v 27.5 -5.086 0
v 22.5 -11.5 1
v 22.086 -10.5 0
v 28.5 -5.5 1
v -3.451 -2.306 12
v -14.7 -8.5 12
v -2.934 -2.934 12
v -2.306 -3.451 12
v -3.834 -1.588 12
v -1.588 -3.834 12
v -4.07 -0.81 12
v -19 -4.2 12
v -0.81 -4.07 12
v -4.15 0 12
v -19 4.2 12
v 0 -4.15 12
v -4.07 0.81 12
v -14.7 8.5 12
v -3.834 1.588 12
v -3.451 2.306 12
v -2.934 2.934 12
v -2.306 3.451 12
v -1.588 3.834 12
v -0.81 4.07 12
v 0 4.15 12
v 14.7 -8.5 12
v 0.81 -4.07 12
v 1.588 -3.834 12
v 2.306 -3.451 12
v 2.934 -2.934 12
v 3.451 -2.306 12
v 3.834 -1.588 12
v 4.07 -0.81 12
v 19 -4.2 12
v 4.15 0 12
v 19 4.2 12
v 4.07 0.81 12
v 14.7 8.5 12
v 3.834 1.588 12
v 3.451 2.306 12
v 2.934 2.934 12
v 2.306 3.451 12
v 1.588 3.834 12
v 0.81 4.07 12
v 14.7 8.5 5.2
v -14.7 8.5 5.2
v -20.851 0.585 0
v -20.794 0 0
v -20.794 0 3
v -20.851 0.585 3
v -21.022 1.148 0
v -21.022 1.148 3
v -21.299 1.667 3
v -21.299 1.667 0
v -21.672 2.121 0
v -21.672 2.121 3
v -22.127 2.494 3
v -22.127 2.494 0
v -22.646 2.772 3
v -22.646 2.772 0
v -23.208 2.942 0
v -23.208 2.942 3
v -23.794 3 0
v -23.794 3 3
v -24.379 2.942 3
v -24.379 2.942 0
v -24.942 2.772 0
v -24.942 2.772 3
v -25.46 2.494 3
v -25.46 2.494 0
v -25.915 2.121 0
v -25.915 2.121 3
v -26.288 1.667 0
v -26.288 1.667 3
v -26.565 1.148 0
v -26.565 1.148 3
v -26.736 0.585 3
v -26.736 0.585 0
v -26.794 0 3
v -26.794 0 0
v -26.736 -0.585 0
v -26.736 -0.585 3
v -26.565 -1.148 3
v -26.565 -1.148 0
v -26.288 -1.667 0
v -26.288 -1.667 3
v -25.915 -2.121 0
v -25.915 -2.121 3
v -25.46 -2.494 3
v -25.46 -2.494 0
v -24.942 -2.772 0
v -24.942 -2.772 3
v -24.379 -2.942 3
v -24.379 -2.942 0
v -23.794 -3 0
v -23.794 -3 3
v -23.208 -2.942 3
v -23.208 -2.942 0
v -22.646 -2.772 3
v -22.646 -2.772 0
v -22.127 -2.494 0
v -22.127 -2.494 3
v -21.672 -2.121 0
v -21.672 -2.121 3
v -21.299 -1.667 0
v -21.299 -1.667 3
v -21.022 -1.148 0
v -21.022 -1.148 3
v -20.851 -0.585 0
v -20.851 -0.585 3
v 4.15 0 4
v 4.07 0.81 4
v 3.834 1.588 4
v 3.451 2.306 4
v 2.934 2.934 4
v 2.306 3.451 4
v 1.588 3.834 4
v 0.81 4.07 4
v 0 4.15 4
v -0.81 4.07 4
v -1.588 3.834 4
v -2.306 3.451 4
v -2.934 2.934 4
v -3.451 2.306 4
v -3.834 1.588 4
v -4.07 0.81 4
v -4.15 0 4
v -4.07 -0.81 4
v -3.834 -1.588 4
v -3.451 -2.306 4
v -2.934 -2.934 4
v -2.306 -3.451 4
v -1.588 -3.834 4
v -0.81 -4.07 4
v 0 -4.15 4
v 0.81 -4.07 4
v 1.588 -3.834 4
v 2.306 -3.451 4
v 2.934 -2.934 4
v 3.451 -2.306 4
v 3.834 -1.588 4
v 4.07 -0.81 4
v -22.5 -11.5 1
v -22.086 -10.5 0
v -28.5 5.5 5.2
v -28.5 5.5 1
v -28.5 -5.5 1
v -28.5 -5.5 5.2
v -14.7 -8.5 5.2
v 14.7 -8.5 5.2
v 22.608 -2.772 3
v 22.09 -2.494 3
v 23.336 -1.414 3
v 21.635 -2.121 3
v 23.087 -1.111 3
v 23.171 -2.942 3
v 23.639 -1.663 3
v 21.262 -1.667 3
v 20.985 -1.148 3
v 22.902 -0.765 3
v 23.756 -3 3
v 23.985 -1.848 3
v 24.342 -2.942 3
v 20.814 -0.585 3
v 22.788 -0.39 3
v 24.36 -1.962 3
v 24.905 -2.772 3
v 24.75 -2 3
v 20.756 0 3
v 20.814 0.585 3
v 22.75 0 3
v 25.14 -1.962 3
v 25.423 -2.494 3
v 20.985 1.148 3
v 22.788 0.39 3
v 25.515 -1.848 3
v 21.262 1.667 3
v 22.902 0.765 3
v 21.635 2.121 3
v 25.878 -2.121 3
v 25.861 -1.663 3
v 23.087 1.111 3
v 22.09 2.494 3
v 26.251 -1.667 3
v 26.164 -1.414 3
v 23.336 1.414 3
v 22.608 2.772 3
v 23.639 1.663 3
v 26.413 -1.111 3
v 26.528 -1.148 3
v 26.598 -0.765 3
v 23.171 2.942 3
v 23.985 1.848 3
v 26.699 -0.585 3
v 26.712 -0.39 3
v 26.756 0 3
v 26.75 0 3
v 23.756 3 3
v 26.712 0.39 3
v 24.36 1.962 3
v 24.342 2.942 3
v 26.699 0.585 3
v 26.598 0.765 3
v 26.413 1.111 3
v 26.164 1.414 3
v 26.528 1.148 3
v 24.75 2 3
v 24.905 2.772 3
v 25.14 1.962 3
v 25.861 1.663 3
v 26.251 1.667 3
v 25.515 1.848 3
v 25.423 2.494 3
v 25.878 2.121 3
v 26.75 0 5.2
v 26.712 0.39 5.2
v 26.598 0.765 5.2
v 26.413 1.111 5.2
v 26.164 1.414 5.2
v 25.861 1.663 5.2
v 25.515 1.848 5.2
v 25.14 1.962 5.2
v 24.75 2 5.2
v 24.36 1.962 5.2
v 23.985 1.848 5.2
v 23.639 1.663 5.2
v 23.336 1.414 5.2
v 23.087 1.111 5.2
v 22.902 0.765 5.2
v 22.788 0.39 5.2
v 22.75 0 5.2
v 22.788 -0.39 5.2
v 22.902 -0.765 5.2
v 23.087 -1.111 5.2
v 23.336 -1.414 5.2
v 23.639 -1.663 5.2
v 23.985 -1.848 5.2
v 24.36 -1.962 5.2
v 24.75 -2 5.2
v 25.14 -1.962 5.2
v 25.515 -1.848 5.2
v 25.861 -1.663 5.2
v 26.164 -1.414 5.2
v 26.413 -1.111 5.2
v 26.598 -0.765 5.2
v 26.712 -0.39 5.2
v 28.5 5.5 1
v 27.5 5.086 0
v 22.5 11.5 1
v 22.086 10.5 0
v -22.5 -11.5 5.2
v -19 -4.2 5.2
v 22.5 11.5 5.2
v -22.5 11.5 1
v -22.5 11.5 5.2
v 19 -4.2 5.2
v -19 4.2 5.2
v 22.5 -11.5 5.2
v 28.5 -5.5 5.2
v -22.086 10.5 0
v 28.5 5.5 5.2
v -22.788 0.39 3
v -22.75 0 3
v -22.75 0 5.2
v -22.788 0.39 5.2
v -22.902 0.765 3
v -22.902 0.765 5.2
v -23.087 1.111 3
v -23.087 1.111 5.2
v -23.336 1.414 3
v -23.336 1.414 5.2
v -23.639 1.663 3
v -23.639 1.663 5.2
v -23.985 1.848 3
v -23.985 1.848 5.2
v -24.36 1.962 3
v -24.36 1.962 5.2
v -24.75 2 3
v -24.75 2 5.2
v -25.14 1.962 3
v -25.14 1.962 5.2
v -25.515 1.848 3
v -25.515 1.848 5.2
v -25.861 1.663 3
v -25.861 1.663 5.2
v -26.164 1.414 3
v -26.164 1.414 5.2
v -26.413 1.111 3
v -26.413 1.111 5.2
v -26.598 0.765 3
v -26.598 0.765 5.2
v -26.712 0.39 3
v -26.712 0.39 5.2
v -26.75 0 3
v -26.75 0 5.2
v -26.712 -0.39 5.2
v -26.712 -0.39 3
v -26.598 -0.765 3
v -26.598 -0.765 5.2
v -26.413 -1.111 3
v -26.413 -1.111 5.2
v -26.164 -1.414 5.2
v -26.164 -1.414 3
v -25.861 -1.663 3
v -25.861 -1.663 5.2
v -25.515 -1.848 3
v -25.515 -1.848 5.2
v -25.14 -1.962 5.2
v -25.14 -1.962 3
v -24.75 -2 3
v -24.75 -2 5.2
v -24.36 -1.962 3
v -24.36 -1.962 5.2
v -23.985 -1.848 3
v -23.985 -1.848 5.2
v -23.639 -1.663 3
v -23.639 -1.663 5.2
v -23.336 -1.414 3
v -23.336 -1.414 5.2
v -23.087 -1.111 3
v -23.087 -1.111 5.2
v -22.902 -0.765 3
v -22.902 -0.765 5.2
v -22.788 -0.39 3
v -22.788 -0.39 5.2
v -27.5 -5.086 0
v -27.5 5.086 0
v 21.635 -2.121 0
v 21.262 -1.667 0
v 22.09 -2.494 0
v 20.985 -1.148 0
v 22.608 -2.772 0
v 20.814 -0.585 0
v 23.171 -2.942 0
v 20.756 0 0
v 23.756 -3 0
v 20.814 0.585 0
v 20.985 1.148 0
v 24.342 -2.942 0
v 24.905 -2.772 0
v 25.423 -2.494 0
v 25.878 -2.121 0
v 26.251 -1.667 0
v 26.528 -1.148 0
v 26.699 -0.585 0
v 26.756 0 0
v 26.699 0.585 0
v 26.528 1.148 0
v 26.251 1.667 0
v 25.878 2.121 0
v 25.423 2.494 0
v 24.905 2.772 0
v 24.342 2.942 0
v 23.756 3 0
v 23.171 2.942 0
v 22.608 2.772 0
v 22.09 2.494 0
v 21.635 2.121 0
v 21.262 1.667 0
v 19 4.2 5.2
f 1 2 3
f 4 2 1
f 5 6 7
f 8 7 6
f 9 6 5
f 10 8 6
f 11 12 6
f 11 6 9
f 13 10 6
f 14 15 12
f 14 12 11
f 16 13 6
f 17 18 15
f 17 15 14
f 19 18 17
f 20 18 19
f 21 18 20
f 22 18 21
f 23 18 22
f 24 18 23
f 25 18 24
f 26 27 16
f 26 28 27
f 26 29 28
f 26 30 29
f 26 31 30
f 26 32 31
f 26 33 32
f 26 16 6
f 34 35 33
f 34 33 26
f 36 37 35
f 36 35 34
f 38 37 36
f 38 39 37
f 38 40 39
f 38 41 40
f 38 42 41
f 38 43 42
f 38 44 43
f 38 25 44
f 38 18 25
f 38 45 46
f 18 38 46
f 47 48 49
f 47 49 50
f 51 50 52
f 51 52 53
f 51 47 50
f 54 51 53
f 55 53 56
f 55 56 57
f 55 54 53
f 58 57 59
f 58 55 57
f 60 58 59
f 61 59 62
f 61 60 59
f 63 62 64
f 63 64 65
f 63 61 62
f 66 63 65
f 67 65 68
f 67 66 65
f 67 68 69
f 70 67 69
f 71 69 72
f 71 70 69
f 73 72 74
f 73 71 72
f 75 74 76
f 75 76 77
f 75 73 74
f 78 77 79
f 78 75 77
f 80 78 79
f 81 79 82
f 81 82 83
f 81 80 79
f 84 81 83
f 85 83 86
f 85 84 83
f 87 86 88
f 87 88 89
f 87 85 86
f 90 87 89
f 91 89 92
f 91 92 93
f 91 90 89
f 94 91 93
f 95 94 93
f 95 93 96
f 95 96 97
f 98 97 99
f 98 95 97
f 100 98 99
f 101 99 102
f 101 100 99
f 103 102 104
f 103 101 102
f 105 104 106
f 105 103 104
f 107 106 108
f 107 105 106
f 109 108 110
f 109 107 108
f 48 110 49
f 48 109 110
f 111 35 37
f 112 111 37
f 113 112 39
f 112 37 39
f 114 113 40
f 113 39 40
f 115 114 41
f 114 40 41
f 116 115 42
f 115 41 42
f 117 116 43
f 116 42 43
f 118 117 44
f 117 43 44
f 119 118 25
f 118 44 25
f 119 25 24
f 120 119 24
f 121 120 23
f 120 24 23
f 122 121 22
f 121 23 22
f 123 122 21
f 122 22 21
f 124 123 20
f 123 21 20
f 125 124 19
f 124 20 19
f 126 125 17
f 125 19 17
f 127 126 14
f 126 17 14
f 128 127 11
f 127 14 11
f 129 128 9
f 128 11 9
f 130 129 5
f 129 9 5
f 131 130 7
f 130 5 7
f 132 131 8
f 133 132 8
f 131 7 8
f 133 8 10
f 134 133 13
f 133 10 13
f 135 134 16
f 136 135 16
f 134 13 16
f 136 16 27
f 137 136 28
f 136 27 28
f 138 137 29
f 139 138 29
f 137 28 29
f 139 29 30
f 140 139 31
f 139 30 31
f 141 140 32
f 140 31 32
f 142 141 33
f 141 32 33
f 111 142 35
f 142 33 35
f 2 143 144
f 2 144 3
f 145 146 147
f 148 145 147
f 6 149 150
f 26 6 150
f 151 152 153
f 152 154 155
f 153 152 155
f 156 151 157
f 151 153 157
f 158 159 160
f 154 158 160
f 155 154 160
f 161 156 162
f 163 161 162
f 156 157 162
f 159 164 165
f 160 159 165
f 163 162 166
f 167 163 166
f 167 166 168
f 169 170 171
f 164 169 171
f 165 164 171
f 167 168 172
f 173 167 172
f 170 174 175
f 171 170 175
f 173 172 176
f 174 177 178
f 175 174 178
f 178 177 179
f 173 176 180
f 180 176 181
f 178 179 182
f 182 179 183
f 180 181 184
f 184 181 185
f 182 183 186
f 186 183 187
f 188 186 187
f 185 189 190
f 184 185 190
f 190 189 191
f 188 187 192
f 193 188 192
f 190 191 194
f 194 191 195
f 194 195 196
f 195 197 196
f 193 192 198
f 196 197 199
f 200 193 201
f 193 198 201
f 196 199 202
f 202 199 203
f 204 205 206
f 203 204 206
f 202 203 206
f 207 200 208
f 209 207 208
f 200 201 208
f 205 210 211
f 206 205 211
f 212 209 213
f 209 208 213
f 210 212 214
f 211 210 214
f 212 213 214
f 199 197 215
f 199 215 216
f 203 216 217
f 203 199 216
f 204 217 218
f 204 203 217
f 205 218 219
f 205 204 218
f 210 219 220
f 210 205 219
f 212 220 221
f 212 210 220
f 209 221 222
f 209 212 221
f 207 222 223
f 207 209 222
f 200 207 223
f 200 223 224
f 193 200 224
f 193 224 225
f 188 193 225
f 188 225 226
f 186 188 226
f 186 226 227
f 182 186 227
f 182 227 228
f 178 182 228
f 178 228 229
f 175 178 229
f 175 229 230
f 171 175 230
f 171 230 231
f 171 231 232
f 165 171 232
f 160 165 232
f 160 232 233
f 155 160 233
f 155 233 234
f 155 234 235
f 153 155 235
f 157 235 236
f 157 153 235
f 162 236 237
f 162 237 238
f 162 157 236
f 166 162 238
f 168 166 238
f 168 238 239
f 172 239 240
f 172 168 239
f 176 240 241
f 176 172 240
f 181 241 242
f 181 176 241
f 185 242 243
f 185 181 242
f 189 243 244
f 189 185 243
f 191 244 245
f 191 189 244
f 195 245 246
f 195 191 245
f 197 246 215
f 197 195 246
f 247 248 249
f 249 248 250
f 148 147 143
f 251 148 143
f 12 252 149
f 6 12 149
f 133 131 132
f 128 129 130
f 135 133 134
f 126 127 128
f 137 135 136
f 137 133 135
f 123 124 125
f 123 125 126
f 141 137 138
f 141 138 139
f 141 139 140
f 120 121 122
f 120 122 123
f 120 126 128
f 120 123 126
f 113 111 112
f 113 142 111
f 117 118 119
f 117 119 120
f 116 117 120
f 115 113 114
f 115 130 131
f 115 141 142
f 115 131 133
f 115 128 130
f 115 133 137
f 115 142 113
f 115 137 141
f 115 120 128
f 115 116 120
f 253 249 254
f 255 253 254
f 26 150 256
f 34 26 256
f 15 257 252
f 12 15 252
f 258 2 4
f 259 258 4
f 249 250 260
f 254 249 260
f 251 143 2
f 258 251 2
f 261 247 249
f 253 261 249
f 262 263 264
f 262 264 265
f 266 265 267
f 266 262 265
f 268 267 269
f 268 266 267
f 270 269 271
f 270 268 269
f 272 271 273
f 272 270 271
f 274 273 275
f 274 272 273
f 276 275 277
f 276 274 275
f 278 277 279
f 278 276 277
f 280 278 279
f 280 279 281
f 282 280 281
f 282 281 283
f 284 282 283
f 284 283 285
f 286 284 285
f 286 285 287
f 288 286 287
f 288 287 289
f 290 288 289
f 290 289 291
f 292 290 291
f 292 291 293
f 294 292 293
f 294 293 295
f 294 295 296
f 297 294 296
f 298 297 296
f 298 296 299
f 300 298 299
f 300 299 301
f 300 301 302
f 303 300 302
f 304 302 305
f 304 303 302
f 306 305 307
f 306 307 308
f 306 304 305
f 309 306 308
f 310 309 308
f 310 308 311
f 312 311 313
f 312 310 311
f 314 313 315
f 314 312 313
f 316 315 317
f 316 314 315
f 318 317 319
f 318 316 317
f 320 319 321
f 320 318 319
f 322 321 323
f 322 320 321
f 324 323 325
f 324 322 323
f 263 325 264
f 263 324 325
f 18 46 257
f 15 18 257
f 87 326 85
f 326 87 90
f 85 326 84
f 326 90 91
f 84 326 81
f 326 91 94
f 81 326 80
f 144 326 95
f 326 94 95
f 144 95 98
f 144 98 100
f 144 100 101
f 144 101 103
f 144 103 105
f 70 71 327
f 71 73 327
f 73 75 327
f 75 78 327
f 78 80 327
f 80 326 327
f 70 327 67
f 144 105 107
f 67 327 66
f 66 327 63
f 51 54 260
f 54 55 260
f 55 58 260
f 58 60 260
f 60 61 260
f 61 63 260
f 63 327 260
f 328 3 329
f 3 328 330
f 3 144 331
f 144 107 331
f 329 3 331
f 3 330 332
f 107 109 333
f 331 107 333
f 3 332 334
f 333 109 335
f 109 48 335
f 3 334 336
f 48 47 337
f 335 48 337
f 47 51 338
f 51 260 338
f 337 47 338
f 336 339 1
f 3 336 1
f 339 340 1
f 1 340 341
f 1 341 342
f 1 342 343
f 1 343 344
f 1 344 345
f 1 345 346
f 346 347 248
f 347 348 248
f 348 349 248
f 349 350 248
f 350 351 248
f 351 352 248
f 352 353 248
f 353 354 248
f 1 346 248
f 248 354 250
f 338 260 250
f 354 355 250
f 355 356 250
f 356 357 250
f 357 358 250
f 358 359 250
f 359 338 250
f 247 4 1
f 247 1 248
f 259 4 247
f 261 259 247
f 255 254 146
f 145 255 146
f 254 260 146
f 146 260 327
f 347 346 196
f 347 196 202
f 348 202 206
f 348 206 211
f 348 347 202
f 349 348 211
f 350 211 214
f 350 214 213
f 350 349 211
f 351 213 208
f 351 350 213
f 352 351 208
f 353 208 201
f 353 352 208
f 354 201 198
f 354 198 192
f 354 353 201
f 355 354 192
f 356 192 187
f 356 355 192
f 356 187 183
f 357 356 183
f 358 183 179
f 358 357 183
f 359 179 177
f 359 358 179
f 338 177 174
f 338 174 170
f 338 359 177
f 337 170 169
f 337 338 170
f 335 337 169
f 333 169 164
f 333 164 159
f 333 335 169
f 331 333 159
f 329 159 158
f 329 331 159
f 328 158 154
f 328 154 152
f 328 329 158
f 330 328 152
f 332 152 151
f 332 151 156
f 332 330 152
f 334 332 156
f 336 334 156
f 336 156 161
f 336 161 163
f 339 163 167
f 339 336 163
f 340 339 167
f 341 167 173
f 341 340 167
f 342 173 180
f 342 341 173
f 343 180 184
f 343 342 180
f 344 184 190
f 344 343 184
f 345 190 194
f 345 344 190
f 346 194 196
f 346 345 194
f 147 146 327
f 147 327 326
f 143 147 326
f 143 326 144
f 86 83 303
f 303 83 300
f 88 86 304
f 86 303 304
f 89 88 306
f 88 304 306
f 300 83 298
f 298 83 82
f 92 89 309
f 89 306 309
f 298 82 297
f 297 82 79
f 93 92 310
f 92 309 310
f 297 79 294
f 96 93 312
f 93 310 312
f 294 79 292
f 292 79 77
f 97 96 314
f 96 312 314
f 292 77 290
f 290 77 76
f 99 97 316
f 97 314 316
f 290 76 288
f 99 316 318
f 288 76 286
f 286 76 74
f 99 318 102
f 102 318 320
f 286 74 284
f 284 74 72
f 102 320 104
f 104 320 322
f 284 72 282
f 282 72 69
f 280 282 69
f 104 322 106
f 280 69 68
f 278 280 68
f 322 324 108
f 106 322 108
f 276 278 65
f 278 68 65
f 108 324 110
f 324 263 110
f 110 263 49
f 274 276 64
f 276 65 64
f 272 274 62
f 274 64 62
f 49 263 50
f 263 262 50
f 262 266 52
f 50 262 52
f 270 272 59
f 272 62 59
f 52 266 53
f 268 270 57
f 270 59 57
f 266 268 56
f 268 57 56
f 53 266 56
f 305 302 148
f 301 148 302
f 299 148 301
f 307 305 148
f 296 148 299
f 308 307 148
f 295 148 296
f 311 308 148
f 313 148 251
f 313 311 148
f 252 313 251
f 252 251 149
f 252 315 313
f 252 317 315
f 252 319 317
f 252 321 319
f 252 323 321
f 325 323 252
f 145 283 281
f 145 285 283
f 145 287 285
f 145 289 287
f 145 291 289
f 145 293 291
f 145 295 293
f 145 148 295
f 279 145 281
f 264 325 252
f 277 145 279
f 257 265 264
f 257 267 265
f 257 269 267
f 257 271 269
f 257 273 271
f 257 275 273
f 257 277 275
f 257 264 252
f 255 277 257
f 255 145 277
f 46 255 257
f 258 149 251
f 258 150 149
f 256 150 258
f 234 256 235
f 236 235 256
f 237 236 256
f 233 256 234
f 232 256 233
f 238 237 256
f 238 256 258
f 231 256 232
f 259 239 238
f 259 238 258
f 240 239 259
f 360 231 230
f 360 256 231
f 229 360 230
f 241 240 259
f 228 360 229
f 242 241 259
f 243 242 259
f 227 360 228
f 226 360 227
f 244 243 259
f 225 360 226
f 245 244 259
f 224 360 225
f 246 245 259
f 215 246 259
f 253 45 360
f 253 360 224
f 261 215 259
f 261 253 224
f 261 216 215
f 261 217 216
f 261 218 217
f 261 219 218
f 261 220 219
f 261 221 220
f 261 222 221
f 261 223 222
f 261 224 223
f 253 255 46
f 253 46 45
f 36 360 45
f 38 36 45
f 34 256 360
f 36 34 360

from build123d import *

# Parameters (mm, degrees)
F1_DEPTH = 12
F0_R     = 2
F2_DEPTH = 5.2
F3_SIZE  = 1
F4_R     = 4.15
F5_DEPTH = 8
F6_R     = 3
F7_DEPTH = 3


with BuildPart() as f1:
    # F0 (on Top) → F1 (new body)
    with BuildSketch(Plane.XY):
        Polygon((14.7, 8.5), (-14.7, 8.5), (-19, 4.2), (-19, -4.2), (-14.7, -8.5), (14.7, -8.5), (19, -4.2), (19, 4.2), align=None)
    extrude(amount=F1_DEPTH)

    # F0 (on Top) → F2 (join)
    with BuildSketch(Plane.XY):
        Polygon((22.5, 11.5), (-22.5, 11.5), (-28.5, 5.5), (-28.5, -5.5), (-22.5, -11.5), (22.5, -11.5), (28.5, -5.5), (28.5, 5.5), align=None)
        with Locations((-24.75, 0)):
            Circle(F0_R, mode=Mode.SUBTRACT)
        Polygon((-19, 4.2), (-14.7, 8.5), (14.7, 8.5), (19, 4.2), (19, -4.2), (14.7, -8.5), (-14.7, -8.5), (-19, -4.2), align=None, mode=Mode.SUBTRACT)
        with Locations((24.75, 0)):
            Circle(F0_R, mode=Mode.SUBTRACT)
    extrude(amount=F2_DEPTH)

    # F3
    f3_edges = [f1.edges().sort_by_distance(p)[0] for p in [
        (0, -11.5, 0),
        (-25.5, -8.5, 0),
        (-28.5, 0, 0),
        (-25.5, 8.5, 0),
        (0, 11.5, 0),
        (25.5, 8.5, 0),
        (28.5, 0, 0),
        (25.5, -8.5, 0),
    ]]
    chamfer(f3_edges, length=F3_SIZE)

    # F4 (on face) → F5 (cut)
    with BuildSketch(Plane.XY.offset(12)):
        Circle(F4_R)
    extrude(amount=-F5_DEPTH, mode=Mode.SUBTRACT)

    # F6 (on Top) → F7 (cut)
    with BuildSketch(Plane.XY):
        with Locations((-23.793586, 0)):
            Circle(F6_R)
        with Locations((23.756452, 0)):
            Circle(F6_R)
    extrude(amount=F7_DEPTH, mode=Mode.SUBTRACT)


solid = f1.part
